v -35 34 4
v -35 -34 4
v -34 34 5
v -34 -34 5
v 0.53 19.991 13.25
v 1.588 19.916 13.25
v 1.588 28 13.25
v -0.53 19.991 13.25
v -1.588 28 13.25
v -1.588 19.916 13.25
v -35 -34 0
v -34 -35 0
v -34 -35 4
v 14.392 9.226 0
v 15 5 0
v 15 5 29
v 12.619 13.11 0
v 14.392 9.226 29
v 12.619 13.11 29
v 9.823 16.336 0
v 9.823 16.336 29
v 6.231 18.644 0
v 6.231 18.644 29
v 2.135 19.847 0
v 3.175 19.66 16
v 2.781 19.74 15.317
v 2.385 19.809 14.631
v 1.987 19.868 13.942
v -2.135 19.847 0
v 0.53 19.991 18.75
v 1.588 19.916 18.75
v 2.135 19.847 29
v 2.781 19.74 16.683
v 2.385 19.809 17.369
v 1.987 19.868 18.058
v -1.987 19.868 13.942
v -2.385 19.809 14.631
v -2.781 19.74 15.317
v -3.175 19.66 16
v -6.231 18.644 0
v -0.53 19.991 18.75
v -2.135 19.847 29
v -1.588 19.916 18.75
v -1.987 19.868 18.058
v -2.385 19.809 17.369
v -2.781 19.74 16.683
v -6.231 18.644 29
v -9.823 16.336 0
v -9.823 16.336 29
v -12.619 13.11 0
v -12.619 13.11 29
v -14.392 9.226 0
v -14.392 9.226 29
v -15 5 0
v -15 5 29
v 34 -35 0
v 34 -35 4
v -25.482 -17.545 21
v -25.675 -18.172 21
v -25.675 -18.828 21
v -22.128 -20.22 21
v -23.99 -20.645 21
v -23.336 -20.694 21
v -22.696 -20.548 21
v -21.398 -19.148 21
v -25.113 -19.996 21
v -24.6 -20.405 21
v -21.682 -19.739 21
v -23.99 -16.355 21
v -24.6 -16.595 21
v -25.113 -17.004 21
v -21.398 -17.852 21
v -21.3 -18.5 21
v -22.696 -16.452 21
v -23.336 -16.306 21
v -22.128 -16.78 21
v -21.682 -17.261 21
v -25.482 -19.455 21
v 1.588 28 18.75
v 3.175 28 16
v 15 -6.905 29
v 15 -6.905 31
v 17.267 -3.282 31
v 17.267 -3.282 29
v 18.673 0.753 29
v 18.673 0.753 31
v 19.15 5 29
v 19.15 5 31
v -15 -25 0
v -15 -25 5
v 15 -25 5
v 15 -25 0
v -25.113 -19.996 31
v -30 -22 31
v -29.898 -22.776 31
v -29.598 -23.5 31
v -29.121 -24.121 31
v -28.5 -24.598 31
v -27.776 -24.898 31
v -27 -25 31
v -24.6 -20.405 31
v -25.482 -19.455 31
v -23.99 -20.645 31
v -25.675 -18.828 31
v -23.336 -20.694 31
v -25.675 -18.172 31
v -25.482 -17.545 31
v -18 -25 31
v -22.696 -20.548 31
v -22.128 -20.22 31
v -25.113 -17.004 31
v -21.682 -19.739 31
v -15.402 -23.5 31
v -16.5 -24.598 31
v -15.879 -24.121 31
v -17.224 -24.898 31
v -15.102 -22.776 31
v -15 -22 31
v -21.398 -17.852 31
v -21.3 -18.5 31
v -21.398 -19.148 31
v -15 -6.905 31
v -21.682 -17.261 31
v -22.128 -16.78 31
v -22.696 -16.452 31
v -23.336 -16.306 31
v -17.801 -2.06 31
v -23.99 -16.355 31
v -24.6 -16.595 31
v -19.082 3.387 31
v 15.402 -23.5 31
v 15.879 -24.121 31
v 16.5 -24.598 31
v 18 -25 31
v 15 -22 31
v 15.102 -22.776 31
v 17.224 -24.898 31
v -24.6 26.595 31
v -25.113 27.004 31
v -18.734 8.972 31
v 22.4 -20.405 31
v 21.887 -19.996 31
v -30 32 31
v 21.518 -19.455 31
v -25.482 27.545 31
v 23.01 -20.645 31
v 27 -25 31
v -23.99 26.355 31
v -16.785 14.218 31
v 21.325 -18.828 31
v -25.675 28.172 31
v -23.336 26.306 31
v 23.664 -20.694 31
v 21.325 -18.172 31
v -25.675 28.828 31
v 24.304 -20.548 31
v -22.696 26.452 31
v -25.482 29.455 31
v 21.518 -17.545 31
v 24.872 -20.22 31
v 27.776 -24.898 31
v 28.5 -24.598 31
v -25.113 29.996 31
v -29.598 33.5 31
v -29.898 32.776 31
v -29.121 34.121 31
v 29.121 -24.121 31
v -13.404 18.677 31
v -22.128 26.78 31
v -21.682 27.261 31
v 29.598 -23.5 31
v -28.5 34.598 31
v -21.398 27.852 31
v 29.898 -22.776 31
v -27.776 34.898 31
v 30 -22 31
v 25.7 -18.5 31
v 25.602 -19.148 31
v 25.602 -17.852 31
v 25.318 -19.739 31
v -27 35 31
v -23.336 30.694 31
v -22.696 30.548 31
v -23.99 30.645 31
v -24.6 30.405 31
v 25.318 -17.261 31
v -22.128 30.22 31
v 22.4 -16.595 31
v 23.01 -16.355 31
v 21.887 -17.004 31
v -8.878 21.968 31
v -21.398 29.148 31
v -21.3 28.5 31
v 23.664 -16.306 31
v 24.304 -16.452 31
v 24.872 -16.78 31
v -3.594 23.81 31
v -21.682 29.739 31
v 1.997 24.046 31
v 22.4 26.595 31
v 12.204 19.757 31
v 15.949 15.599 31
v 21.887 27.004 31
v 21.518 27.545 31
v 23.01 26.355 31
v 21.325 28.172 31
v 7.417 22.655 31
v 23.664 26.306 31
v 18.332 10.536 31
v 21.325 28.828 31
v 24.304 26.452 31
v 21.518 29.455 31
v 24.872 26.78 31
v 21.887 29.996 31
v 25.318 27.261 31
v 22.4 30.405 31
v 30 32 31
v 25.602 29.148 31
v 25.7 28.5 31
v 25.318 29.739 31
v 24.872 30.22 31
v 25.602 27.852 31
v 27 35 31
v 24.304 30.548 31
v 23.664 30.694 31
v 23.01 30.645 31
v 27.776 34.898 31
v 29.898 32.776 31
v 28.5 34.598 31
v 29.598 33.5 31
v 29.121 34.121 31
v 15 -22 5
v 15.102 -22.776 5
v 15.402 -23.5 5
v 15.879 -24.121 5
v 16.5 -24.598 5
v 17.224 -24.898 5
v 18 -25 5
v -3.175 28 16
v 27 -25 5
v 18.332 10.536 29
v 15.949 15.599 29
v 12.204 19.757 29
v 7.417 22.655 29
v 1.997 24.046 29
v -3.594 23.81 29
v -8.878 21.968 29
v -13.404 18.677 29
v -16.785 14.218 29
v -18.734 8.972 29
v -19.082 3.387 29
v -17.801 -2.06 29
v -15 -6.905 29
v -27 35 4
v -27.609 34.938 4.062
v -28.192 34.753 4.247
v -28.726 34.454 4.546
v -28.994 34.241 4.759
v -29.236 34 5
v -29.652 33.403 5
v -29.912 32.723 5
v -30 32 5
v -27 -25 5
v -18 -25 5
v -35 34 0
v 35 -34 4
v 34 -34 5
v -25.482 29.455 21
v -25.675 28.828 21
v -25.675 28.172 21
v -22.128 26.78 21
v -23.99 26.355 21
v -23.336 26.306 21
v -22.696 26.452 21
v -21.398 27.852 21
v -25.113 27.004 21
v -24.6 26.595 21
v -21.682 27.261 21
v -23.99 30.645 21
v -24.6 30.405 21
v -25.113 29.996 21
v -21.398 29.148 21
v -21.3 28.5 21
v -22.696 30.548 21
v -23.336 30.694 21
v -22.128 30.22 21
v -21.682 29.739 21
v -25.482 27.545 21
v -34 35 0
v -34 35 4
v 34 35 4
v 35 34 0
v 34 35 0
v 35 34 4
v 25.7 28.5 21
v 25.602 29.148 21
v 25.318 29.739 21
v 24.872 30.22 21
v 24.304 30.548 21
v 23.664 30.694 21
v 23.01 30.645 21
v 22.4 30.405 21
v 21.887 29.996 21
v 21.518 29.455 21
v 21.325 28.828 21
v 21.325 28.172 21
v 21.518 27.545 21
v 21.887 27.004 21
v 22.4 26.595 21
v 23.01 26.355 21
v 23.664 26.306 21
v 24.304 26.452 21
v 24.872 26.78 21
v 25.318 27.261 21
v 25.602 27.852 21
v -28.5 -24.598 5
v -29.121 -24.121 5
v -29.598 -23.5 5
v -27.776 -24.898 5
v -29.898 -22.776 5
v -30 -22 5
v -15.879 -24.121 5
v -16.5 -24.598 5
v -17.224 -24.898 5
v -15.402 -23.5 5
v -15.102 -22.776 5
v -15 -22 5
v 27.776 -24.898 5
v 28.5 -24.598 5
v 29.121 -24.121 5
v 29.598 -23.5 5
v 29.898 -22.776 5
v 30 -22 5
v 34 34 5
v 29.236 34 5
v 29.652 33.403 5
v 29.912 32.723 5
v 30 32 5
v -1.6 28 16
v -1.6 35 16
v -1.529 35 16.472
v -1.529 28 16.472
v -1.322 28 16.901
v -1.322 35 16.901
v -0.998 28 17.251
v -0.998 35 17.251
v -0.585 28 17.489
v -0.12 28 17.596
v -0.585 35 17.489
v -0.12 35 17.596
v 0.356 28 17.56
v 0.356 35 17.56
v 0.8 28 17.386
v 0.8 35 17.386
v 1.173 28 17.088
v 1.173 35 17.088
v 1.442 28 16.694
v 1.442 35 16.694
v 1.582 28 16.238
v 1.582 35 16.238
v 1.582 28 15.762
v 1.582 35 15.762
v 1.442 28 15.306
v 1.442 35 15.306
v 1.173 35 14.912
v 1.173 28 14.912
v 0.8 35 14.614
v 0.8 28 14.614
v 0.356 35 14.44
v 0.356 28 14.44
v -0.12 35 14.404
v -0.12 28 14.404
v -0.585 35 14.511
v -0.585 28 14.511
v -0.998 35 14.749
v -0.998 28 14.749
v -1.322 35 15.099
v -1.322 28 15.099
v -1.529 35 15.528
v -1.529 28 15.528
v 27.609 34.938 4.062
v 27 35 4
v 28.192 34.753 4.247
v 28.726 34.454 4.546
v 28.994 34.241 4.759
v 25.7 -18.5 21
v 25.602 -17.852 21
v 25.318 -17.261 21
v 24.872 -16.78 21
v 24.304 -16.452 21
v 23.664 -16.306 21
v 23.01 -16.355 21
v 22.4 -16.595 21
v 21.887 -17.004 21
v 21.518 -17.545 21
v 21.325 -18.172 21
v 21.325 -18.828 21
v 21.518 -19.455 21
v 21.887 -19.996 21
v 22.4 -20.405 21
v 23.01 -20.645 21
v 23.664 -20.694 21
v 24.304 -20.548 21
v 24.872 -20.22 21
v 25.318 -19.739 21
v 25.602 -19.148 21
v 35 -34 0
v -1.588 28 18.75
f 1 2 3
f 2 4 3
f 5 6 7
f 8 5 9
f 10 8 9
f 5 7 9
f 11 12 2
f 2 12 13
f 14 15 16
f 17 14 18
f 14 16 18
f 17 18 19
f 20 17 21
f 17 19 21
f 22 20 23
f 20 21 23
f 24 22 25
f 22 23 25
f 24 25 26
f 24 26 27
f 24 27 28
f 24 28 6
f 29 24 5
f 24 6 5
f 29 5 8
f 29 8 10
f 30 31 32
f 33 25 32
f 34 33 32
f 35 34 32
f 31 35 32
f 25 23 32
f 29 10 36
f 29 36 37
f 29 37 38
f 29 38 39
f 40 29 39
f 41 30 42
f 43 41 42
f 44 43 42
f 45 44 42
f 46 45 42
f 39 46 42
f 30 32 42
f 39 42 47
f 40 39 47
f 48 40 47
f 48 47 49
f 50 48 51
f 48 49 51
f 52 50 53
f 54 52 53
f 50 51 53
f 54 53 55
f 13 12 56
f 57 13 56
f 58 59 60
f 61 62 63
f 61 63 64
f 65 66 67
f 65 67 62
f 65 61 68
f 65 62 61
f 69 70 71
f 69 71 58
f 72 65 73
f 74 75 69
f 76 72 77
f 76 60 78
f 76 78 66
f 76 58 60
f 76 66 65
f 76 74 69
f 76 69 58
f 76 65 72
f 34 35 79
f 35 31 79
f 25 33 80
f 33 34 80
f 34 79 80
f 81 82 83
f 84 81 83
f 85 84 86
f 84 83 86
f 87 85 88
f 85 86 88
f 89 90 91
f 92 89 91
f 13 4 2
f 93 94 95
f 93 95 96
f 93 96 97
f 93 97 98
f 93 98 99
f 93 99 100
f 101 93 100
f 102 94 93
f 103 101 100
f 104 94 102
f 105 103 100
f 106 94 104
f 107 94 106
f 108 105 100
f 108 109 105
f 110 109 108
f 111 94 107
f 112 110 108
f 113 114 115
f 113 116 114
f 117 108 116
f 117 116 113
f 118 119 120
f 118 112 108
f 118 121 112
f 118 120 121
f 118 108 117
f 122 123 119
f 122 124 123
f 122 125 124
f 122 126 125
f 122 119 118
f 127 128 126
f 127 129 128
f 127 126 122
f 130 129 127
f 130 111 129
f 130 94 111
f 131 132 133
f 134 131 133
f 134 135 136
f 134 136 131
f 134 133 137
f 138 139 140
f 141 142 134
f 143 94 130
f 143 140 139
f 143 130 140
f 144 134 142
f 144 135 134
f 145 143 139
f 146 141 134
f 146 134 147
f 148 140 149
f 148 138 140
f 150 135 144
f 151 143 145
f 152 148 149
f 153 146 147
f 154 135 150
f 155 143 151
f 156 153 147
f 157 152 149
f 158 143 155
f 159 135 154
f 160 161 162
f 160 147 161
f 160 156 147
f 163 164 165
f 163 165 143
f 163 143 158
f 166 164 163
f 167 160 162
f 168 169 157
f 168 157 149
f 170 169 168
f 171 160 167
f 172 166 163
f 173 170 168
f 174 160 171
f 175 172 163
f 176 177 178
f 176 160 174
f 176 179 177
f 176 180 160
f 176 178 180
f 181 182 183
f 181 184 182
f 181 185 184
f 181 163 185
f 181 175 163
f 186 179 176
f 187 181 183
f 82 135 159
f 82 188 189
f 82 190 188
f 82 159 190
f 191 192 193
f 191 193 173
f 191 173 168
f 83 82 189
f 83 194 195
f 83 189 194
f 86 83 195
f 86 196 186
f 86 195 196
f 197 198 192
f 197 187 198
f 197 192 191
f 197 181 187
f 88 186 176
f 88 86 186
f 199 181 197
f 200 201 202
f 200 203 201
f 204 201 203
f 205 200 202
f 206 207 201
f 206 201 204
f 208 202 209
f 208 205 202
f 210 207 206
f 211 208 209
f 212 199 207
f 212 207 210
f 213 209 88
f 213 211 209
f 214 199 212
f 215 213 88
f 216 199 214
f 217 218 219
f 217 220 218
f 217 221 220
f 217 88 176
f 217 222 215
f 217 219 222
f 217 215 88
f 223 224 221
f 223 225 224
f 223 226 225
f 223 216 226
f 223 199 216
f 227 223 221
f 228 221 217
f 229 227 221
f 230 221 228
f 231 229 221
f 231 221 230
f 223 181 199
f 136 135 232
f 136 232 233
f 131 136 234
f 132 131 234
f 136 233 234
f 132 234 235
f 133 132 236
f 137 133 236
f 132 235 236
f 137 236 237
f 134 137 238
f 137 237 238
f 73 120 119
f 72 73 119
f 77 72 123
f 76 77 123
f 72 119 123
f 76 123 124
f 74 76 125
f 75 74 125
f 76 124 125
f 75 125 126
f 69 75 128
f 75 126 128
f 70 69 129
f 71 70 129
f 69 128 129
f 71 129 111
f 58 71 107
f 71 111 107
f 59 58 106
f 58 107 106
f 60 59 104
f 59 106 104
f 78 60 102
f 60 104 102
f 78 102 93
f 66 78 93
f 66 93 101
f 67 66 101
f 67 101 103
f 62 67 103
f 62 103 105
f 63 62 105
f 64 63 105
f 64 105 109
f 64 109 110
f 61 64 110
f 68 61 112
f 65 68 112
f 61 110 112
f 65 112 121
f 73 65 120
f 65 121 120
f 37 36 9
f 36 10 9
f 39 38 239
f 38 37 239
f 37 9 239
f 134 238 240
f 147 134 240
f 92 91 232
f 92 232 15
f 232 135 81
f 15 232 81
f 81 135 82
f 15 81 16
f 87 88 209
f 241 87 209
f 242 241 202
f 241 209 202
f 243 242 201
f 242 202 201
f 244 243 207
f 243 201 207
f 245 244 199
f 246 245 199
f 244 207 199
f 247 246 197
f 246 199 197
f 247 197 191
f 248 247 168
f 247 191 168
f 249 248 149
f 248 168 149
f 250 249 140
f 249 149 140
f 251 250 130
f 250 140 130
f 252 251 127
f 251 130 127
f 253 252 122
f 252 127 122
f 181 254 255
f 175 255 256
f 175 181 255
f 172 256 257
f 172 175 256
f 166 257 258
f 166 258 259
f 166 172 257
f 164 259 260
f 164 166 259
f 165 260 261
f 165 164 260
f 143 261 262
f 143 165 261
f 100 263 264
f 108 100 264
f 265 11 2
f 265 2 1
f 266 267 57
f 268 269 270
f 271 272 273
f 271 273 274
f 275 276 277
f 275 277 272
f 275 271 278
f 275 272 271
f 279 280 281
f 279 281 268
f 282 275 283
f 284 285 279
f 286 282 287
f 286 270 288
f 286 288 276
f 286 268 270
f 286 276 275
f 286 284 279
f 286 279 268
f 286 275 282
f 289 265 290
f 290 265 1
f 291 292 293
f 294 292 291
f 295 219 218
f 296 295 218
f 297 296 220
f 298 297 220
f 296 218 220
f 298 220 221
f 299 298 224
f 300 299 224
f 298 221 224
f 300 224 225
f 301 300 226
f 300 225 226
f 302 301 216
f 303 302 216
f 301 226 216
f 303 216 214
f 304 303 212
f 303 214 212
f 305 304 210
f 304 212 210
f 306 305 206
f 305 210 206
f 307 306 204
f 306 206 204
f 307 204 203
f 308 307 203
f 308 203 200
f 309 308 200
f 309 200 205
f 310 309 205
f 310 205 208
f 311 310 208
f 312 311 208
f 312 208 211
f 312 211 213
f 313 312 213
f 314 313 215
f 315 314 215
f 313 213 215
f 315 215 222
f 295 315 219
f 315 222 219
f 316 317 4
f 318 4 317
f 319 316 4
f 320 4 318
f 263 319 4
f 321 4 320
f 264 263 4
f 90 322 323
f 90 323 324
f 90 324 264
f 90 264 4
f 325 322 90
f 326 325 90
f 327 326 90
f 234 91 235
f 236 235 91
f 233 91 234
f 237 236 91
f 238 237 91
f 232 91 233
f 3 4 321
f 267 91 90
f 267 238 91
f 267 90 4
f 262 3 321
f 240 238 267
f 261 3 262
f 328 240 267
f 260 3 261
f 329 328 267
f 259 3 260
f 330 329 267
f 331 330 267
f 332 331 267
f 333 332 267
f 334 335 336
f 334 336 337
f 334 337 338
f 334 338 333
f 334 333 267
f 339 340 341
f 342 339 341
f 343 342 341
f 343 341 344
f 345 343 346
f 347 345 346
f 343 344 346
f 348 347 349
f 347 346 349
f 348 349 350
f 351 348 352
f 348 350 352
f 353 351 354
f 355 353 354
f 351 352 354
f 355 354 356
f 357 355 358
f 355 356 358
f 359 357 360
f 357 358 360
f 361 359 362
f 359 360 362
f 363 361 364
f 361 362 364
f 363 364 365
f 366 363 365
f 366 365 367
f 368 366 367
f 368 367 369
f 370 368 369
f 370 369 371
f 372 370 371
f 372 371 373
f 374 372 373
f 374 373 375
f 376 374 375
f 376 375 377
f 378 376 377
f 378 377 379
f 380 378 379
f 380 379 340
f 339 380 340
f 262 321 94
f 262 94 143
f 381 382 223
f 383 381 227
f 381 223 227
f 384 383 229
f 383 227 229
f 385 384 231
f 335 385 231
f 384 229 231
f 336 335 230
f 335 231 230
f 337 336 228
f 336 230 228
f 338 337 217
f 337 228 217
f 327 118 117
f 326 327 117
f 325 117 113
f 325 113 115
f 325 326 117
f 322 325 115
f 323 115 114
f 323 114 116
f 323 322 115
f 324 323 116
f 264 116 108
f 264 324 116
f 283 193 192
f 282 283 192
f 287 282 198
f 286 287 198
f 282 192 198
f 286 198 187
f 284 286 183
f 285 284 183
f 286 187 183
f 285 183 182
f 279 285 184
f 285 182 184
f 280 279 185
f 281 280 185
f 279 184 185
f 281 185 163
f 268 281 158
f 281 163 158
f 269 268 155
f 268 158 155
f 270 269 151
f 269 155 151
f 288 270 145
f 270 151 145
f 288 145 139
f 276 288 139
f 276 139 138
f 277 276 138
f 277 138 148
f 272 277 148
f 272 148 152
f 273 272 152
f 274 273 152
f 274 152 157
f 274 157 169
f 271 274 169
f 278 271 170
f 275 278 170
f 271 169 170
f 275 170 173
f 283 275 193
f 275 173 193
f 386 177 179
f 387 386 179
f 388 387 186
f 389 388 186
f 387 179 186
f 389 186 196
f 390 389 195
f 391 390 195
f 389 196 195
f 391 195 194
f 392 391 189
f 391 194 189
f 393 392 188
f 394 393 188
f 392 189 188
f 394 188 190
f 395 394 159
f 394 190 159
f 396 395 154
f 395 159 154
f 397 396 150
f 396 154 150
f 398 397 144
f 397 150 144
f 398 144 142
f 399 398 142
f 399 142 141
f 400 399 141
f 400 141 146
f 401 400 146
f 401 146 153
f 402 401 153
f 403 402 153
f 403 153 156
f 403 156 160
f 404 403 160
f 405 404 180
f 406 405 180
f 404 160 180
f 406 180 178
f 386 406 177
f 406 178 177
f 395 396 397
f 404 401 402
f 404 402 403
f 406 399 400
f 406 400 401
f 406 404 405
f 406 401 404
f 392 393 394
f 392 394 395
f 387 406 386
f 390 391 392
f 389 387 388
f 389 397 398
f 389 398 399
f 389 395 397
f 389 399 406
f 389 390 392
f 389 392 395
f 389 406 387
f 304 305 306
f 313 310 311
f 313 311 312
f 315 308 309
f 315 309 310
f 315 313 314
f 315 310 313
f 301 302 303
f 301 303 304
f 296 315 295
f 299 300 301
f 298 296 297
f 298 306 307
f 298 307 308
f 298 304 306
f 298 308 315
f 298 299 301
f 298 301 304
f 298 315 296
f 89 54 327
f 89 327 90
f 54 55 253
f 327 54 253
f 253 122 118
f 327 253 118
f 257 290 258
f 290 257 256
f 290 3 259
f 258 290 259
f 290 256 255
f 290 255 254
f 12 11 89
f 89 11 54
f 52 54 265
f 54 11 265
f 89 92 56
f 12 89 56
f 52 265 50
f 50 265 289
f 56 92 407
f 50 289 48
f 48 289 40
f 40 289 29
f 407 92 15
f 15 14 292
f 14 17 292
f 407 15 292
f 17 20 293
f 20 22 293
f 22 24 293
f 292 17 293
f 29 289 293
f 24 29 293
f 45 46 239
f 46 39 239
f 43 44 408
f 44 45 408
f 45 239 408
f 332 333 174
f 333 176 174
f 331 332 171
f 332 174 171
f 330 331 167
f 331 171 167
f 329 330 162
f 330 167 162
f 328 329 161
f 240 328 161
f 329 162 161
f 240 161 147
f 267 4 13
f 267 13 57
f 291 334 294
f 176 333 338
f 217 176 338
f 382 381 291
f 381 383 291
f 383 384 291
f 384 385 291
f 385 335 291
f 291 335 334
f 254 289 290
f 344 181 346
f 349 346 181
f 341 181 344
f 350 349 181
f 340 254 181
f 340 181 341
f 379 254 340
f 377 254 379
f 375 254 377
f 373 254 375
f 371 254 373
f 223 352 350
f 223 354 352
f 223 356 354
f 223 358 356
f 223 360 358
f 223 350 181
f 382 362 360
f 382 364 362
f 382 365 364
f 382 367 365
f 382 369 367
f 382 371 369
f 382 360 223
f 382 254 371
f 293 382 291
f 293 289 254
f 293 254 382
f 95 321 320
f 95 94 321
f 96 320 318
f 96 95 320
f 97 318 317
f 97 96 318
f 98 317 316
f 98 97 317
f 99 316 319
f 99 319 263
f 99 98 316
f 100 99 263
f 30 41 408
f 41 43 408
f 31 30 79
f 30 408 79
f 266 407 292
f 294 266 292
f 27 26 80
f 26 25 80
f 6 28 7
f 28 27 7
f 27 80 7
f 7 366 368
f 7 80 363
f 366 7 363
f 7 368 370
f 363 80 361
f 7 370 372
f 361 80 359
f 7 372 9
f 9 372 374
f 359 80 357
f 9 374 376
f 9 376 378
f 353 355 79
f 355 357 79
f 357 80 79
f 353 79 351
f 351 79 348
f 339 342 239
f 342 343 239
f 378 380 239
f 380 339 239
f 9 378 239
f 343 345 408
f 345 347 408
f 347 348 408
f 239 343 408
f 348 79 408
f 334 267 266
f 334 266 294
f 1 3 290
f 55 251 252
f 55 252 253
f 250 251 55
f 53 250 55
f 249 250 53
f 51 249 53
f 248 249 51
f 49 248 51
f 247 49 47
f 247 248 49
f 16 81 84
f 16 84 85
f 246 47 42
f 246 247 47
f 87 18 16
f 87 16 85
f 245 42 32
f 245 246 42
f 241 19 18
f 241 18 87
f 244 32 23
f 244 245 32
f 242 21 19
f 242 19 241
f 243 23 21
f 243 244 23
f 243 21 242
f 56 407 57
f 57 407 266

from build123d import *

# Parameters (mm, degrees)
F0_W      = 70
F0_H      = 70
F1_DEPTH  = 5
F2_W      = 60
F2_H      = 60
F3_DEPTH  = 26
F4_R      = 2.2
F5_DEPTH  = 10
F6_DEPTH  = 31.001
F7_DEPTH  = 2
F8_R      = 1.6
F9_DEPTH  = 70.001
F10_START = -7
F10_DEPTH = 18
F11_R     = 3
F12_SIZE  = 1


with BuildPart() as f1:
    # F0 (on Top) → F1 (new body)
    with BuildSketch(Plane.XY):
        Rectangle(F0_W, F0_H)
    extrude(amount=F1_DEPTH)

    # F2 (on face) → F3 (join)
    with BuildSketch(Plane.XY.offset(5)):
        with Locations((0, 5)):
            Rectangle(F2_W, F2_H)
    extrude(amount=F3_DEPTH)

    # F4 (on face) → F5 (cut)
    with BuildSketch(Plane.XY.offset(31)):
        with Locations((-23.5, -18.5)):
            Circle(F4_R)
        with Locations((-23.5, 28.5)):
            Circle(F4_R)
        with Locations((23.5, 28.5)):
            Circle(F4_R)
        with Locations((23.5, -18.5)):
            Circle(F4_R)
    extrude(amount=-F5_DEPTH, mode=Mode.SUBTRACT)

    # F4 (on face) → F6 (cut, through all)
    with BuildSketch(Plane.XY.offset(31)):
        with BuildLine():
            ThreePointArc((-15, 5), (0, -10), (15, 5))
            ThreePointArc((15, 5), (0, 20), (-15, 5))
        make_face()
        with BuildLine():
            Line((15, -6.9047259523), (15, 5))
            ThreePointArc((15, 5), (0, -10), (-15, 5))
            Line((-15, 5), (-15, -6.9047259523))
            ThreePointArc((-15, -6.9047259523), (0, -14.15), (15, -6.9047259523))
        make_face()
        with BuildLine():
            Line((15, -25), (15, -6.9047259523))
            ThreePointArc((15, -6.9047259523), (0, -14.15), (-15, -6.9047259523))
            Line((-15, -6.9047259523), (-15, -25))
            Line((-15, -25), (15, -25))
        make_face()
    extrude(amount=-F6_DEPTH, mode=Mode.SUBTRACT)

    # F4 (on face) → F7 (cut)
    with BuildSketch(Plane.XY.offset(31)):
        with BuildLine():
            ThreePointArc((-15, 5), (0, 20), (15, 5))
            Line((15, 5), (15, -6.9047259523))
            ThreePointArc((15, -6.9047259523), (18.0827611277, -1.3036695662), (19.15, 5))
            ThreePointArc((19.15, 5), (-6.3036695662, 23.0827611277), (-15, -6.9047259523))
            Line((-15, -6.9047259523), (-15, 5))
        make_face()
    extrude(amount=-F7_DEPTH, mode=Mode.SUBTRACT)

    # F8 (on face) → F9 (cut, through all)
    with BuildSketch(Plane(origin=(0, 35, 0), x_dir=(-1, 0, 0), z_dir=(0, 1, 0))):
        with Locations((0, 16)):
            Circle(F8_R)
    extrude(amount=-F9_DEPTH, mode=Mode.SUBTRACT)

    # F8 (on face) → F10 (cut)
    with BuildSketch(Plane(origin=(0, 35, 0), x_dir=(-1, 0, 0), z_dir=(0, 1, 0)).offset(F10_START)):
        Polygon((3.1754264805, 16), (1.5877132403, 18.75), (-1.5877132403, 18.75), (-3.1754264805, 16), (-1.5877132403, 13.25), (1.5877132403, 13.25), align=None)
        with Locations((0, 16)):
            Circle(F8_R, mode=Mode.SUBTRACT)
    extrude(amount=-F10_DEPTH, mode=Mode.SUBTRACT)

    # F11
    f11_edges = [f1.edges().sort_by_distance(p)[0] for p in [
        (30, -25, 18),
        (-30, -25, 18),
        (30, 35, 18),
        (-30, 35, 18),
        (-15, -25, 18),
        (15, -25, 18),
    ]]
    fillet(f11_edges, radius=F11_R)

    # F12
    f12_edges = [f1.edges().sort_by_distance(p)[0] for p in [
        (-35, 0, 5),
        (0, -35, 5),
        (35, 0, 5),
        (32.5, 35, 5),
        (-32.5, 35, 5),
        (35, -35, 2.5),
        (-35, -35, 2.5),
        (-35, 35, 2.5),
        (35, 35, 2.5),
    ]]
    chamfer(f12_edges, length=F12_SIZE)


solid = f1.part
